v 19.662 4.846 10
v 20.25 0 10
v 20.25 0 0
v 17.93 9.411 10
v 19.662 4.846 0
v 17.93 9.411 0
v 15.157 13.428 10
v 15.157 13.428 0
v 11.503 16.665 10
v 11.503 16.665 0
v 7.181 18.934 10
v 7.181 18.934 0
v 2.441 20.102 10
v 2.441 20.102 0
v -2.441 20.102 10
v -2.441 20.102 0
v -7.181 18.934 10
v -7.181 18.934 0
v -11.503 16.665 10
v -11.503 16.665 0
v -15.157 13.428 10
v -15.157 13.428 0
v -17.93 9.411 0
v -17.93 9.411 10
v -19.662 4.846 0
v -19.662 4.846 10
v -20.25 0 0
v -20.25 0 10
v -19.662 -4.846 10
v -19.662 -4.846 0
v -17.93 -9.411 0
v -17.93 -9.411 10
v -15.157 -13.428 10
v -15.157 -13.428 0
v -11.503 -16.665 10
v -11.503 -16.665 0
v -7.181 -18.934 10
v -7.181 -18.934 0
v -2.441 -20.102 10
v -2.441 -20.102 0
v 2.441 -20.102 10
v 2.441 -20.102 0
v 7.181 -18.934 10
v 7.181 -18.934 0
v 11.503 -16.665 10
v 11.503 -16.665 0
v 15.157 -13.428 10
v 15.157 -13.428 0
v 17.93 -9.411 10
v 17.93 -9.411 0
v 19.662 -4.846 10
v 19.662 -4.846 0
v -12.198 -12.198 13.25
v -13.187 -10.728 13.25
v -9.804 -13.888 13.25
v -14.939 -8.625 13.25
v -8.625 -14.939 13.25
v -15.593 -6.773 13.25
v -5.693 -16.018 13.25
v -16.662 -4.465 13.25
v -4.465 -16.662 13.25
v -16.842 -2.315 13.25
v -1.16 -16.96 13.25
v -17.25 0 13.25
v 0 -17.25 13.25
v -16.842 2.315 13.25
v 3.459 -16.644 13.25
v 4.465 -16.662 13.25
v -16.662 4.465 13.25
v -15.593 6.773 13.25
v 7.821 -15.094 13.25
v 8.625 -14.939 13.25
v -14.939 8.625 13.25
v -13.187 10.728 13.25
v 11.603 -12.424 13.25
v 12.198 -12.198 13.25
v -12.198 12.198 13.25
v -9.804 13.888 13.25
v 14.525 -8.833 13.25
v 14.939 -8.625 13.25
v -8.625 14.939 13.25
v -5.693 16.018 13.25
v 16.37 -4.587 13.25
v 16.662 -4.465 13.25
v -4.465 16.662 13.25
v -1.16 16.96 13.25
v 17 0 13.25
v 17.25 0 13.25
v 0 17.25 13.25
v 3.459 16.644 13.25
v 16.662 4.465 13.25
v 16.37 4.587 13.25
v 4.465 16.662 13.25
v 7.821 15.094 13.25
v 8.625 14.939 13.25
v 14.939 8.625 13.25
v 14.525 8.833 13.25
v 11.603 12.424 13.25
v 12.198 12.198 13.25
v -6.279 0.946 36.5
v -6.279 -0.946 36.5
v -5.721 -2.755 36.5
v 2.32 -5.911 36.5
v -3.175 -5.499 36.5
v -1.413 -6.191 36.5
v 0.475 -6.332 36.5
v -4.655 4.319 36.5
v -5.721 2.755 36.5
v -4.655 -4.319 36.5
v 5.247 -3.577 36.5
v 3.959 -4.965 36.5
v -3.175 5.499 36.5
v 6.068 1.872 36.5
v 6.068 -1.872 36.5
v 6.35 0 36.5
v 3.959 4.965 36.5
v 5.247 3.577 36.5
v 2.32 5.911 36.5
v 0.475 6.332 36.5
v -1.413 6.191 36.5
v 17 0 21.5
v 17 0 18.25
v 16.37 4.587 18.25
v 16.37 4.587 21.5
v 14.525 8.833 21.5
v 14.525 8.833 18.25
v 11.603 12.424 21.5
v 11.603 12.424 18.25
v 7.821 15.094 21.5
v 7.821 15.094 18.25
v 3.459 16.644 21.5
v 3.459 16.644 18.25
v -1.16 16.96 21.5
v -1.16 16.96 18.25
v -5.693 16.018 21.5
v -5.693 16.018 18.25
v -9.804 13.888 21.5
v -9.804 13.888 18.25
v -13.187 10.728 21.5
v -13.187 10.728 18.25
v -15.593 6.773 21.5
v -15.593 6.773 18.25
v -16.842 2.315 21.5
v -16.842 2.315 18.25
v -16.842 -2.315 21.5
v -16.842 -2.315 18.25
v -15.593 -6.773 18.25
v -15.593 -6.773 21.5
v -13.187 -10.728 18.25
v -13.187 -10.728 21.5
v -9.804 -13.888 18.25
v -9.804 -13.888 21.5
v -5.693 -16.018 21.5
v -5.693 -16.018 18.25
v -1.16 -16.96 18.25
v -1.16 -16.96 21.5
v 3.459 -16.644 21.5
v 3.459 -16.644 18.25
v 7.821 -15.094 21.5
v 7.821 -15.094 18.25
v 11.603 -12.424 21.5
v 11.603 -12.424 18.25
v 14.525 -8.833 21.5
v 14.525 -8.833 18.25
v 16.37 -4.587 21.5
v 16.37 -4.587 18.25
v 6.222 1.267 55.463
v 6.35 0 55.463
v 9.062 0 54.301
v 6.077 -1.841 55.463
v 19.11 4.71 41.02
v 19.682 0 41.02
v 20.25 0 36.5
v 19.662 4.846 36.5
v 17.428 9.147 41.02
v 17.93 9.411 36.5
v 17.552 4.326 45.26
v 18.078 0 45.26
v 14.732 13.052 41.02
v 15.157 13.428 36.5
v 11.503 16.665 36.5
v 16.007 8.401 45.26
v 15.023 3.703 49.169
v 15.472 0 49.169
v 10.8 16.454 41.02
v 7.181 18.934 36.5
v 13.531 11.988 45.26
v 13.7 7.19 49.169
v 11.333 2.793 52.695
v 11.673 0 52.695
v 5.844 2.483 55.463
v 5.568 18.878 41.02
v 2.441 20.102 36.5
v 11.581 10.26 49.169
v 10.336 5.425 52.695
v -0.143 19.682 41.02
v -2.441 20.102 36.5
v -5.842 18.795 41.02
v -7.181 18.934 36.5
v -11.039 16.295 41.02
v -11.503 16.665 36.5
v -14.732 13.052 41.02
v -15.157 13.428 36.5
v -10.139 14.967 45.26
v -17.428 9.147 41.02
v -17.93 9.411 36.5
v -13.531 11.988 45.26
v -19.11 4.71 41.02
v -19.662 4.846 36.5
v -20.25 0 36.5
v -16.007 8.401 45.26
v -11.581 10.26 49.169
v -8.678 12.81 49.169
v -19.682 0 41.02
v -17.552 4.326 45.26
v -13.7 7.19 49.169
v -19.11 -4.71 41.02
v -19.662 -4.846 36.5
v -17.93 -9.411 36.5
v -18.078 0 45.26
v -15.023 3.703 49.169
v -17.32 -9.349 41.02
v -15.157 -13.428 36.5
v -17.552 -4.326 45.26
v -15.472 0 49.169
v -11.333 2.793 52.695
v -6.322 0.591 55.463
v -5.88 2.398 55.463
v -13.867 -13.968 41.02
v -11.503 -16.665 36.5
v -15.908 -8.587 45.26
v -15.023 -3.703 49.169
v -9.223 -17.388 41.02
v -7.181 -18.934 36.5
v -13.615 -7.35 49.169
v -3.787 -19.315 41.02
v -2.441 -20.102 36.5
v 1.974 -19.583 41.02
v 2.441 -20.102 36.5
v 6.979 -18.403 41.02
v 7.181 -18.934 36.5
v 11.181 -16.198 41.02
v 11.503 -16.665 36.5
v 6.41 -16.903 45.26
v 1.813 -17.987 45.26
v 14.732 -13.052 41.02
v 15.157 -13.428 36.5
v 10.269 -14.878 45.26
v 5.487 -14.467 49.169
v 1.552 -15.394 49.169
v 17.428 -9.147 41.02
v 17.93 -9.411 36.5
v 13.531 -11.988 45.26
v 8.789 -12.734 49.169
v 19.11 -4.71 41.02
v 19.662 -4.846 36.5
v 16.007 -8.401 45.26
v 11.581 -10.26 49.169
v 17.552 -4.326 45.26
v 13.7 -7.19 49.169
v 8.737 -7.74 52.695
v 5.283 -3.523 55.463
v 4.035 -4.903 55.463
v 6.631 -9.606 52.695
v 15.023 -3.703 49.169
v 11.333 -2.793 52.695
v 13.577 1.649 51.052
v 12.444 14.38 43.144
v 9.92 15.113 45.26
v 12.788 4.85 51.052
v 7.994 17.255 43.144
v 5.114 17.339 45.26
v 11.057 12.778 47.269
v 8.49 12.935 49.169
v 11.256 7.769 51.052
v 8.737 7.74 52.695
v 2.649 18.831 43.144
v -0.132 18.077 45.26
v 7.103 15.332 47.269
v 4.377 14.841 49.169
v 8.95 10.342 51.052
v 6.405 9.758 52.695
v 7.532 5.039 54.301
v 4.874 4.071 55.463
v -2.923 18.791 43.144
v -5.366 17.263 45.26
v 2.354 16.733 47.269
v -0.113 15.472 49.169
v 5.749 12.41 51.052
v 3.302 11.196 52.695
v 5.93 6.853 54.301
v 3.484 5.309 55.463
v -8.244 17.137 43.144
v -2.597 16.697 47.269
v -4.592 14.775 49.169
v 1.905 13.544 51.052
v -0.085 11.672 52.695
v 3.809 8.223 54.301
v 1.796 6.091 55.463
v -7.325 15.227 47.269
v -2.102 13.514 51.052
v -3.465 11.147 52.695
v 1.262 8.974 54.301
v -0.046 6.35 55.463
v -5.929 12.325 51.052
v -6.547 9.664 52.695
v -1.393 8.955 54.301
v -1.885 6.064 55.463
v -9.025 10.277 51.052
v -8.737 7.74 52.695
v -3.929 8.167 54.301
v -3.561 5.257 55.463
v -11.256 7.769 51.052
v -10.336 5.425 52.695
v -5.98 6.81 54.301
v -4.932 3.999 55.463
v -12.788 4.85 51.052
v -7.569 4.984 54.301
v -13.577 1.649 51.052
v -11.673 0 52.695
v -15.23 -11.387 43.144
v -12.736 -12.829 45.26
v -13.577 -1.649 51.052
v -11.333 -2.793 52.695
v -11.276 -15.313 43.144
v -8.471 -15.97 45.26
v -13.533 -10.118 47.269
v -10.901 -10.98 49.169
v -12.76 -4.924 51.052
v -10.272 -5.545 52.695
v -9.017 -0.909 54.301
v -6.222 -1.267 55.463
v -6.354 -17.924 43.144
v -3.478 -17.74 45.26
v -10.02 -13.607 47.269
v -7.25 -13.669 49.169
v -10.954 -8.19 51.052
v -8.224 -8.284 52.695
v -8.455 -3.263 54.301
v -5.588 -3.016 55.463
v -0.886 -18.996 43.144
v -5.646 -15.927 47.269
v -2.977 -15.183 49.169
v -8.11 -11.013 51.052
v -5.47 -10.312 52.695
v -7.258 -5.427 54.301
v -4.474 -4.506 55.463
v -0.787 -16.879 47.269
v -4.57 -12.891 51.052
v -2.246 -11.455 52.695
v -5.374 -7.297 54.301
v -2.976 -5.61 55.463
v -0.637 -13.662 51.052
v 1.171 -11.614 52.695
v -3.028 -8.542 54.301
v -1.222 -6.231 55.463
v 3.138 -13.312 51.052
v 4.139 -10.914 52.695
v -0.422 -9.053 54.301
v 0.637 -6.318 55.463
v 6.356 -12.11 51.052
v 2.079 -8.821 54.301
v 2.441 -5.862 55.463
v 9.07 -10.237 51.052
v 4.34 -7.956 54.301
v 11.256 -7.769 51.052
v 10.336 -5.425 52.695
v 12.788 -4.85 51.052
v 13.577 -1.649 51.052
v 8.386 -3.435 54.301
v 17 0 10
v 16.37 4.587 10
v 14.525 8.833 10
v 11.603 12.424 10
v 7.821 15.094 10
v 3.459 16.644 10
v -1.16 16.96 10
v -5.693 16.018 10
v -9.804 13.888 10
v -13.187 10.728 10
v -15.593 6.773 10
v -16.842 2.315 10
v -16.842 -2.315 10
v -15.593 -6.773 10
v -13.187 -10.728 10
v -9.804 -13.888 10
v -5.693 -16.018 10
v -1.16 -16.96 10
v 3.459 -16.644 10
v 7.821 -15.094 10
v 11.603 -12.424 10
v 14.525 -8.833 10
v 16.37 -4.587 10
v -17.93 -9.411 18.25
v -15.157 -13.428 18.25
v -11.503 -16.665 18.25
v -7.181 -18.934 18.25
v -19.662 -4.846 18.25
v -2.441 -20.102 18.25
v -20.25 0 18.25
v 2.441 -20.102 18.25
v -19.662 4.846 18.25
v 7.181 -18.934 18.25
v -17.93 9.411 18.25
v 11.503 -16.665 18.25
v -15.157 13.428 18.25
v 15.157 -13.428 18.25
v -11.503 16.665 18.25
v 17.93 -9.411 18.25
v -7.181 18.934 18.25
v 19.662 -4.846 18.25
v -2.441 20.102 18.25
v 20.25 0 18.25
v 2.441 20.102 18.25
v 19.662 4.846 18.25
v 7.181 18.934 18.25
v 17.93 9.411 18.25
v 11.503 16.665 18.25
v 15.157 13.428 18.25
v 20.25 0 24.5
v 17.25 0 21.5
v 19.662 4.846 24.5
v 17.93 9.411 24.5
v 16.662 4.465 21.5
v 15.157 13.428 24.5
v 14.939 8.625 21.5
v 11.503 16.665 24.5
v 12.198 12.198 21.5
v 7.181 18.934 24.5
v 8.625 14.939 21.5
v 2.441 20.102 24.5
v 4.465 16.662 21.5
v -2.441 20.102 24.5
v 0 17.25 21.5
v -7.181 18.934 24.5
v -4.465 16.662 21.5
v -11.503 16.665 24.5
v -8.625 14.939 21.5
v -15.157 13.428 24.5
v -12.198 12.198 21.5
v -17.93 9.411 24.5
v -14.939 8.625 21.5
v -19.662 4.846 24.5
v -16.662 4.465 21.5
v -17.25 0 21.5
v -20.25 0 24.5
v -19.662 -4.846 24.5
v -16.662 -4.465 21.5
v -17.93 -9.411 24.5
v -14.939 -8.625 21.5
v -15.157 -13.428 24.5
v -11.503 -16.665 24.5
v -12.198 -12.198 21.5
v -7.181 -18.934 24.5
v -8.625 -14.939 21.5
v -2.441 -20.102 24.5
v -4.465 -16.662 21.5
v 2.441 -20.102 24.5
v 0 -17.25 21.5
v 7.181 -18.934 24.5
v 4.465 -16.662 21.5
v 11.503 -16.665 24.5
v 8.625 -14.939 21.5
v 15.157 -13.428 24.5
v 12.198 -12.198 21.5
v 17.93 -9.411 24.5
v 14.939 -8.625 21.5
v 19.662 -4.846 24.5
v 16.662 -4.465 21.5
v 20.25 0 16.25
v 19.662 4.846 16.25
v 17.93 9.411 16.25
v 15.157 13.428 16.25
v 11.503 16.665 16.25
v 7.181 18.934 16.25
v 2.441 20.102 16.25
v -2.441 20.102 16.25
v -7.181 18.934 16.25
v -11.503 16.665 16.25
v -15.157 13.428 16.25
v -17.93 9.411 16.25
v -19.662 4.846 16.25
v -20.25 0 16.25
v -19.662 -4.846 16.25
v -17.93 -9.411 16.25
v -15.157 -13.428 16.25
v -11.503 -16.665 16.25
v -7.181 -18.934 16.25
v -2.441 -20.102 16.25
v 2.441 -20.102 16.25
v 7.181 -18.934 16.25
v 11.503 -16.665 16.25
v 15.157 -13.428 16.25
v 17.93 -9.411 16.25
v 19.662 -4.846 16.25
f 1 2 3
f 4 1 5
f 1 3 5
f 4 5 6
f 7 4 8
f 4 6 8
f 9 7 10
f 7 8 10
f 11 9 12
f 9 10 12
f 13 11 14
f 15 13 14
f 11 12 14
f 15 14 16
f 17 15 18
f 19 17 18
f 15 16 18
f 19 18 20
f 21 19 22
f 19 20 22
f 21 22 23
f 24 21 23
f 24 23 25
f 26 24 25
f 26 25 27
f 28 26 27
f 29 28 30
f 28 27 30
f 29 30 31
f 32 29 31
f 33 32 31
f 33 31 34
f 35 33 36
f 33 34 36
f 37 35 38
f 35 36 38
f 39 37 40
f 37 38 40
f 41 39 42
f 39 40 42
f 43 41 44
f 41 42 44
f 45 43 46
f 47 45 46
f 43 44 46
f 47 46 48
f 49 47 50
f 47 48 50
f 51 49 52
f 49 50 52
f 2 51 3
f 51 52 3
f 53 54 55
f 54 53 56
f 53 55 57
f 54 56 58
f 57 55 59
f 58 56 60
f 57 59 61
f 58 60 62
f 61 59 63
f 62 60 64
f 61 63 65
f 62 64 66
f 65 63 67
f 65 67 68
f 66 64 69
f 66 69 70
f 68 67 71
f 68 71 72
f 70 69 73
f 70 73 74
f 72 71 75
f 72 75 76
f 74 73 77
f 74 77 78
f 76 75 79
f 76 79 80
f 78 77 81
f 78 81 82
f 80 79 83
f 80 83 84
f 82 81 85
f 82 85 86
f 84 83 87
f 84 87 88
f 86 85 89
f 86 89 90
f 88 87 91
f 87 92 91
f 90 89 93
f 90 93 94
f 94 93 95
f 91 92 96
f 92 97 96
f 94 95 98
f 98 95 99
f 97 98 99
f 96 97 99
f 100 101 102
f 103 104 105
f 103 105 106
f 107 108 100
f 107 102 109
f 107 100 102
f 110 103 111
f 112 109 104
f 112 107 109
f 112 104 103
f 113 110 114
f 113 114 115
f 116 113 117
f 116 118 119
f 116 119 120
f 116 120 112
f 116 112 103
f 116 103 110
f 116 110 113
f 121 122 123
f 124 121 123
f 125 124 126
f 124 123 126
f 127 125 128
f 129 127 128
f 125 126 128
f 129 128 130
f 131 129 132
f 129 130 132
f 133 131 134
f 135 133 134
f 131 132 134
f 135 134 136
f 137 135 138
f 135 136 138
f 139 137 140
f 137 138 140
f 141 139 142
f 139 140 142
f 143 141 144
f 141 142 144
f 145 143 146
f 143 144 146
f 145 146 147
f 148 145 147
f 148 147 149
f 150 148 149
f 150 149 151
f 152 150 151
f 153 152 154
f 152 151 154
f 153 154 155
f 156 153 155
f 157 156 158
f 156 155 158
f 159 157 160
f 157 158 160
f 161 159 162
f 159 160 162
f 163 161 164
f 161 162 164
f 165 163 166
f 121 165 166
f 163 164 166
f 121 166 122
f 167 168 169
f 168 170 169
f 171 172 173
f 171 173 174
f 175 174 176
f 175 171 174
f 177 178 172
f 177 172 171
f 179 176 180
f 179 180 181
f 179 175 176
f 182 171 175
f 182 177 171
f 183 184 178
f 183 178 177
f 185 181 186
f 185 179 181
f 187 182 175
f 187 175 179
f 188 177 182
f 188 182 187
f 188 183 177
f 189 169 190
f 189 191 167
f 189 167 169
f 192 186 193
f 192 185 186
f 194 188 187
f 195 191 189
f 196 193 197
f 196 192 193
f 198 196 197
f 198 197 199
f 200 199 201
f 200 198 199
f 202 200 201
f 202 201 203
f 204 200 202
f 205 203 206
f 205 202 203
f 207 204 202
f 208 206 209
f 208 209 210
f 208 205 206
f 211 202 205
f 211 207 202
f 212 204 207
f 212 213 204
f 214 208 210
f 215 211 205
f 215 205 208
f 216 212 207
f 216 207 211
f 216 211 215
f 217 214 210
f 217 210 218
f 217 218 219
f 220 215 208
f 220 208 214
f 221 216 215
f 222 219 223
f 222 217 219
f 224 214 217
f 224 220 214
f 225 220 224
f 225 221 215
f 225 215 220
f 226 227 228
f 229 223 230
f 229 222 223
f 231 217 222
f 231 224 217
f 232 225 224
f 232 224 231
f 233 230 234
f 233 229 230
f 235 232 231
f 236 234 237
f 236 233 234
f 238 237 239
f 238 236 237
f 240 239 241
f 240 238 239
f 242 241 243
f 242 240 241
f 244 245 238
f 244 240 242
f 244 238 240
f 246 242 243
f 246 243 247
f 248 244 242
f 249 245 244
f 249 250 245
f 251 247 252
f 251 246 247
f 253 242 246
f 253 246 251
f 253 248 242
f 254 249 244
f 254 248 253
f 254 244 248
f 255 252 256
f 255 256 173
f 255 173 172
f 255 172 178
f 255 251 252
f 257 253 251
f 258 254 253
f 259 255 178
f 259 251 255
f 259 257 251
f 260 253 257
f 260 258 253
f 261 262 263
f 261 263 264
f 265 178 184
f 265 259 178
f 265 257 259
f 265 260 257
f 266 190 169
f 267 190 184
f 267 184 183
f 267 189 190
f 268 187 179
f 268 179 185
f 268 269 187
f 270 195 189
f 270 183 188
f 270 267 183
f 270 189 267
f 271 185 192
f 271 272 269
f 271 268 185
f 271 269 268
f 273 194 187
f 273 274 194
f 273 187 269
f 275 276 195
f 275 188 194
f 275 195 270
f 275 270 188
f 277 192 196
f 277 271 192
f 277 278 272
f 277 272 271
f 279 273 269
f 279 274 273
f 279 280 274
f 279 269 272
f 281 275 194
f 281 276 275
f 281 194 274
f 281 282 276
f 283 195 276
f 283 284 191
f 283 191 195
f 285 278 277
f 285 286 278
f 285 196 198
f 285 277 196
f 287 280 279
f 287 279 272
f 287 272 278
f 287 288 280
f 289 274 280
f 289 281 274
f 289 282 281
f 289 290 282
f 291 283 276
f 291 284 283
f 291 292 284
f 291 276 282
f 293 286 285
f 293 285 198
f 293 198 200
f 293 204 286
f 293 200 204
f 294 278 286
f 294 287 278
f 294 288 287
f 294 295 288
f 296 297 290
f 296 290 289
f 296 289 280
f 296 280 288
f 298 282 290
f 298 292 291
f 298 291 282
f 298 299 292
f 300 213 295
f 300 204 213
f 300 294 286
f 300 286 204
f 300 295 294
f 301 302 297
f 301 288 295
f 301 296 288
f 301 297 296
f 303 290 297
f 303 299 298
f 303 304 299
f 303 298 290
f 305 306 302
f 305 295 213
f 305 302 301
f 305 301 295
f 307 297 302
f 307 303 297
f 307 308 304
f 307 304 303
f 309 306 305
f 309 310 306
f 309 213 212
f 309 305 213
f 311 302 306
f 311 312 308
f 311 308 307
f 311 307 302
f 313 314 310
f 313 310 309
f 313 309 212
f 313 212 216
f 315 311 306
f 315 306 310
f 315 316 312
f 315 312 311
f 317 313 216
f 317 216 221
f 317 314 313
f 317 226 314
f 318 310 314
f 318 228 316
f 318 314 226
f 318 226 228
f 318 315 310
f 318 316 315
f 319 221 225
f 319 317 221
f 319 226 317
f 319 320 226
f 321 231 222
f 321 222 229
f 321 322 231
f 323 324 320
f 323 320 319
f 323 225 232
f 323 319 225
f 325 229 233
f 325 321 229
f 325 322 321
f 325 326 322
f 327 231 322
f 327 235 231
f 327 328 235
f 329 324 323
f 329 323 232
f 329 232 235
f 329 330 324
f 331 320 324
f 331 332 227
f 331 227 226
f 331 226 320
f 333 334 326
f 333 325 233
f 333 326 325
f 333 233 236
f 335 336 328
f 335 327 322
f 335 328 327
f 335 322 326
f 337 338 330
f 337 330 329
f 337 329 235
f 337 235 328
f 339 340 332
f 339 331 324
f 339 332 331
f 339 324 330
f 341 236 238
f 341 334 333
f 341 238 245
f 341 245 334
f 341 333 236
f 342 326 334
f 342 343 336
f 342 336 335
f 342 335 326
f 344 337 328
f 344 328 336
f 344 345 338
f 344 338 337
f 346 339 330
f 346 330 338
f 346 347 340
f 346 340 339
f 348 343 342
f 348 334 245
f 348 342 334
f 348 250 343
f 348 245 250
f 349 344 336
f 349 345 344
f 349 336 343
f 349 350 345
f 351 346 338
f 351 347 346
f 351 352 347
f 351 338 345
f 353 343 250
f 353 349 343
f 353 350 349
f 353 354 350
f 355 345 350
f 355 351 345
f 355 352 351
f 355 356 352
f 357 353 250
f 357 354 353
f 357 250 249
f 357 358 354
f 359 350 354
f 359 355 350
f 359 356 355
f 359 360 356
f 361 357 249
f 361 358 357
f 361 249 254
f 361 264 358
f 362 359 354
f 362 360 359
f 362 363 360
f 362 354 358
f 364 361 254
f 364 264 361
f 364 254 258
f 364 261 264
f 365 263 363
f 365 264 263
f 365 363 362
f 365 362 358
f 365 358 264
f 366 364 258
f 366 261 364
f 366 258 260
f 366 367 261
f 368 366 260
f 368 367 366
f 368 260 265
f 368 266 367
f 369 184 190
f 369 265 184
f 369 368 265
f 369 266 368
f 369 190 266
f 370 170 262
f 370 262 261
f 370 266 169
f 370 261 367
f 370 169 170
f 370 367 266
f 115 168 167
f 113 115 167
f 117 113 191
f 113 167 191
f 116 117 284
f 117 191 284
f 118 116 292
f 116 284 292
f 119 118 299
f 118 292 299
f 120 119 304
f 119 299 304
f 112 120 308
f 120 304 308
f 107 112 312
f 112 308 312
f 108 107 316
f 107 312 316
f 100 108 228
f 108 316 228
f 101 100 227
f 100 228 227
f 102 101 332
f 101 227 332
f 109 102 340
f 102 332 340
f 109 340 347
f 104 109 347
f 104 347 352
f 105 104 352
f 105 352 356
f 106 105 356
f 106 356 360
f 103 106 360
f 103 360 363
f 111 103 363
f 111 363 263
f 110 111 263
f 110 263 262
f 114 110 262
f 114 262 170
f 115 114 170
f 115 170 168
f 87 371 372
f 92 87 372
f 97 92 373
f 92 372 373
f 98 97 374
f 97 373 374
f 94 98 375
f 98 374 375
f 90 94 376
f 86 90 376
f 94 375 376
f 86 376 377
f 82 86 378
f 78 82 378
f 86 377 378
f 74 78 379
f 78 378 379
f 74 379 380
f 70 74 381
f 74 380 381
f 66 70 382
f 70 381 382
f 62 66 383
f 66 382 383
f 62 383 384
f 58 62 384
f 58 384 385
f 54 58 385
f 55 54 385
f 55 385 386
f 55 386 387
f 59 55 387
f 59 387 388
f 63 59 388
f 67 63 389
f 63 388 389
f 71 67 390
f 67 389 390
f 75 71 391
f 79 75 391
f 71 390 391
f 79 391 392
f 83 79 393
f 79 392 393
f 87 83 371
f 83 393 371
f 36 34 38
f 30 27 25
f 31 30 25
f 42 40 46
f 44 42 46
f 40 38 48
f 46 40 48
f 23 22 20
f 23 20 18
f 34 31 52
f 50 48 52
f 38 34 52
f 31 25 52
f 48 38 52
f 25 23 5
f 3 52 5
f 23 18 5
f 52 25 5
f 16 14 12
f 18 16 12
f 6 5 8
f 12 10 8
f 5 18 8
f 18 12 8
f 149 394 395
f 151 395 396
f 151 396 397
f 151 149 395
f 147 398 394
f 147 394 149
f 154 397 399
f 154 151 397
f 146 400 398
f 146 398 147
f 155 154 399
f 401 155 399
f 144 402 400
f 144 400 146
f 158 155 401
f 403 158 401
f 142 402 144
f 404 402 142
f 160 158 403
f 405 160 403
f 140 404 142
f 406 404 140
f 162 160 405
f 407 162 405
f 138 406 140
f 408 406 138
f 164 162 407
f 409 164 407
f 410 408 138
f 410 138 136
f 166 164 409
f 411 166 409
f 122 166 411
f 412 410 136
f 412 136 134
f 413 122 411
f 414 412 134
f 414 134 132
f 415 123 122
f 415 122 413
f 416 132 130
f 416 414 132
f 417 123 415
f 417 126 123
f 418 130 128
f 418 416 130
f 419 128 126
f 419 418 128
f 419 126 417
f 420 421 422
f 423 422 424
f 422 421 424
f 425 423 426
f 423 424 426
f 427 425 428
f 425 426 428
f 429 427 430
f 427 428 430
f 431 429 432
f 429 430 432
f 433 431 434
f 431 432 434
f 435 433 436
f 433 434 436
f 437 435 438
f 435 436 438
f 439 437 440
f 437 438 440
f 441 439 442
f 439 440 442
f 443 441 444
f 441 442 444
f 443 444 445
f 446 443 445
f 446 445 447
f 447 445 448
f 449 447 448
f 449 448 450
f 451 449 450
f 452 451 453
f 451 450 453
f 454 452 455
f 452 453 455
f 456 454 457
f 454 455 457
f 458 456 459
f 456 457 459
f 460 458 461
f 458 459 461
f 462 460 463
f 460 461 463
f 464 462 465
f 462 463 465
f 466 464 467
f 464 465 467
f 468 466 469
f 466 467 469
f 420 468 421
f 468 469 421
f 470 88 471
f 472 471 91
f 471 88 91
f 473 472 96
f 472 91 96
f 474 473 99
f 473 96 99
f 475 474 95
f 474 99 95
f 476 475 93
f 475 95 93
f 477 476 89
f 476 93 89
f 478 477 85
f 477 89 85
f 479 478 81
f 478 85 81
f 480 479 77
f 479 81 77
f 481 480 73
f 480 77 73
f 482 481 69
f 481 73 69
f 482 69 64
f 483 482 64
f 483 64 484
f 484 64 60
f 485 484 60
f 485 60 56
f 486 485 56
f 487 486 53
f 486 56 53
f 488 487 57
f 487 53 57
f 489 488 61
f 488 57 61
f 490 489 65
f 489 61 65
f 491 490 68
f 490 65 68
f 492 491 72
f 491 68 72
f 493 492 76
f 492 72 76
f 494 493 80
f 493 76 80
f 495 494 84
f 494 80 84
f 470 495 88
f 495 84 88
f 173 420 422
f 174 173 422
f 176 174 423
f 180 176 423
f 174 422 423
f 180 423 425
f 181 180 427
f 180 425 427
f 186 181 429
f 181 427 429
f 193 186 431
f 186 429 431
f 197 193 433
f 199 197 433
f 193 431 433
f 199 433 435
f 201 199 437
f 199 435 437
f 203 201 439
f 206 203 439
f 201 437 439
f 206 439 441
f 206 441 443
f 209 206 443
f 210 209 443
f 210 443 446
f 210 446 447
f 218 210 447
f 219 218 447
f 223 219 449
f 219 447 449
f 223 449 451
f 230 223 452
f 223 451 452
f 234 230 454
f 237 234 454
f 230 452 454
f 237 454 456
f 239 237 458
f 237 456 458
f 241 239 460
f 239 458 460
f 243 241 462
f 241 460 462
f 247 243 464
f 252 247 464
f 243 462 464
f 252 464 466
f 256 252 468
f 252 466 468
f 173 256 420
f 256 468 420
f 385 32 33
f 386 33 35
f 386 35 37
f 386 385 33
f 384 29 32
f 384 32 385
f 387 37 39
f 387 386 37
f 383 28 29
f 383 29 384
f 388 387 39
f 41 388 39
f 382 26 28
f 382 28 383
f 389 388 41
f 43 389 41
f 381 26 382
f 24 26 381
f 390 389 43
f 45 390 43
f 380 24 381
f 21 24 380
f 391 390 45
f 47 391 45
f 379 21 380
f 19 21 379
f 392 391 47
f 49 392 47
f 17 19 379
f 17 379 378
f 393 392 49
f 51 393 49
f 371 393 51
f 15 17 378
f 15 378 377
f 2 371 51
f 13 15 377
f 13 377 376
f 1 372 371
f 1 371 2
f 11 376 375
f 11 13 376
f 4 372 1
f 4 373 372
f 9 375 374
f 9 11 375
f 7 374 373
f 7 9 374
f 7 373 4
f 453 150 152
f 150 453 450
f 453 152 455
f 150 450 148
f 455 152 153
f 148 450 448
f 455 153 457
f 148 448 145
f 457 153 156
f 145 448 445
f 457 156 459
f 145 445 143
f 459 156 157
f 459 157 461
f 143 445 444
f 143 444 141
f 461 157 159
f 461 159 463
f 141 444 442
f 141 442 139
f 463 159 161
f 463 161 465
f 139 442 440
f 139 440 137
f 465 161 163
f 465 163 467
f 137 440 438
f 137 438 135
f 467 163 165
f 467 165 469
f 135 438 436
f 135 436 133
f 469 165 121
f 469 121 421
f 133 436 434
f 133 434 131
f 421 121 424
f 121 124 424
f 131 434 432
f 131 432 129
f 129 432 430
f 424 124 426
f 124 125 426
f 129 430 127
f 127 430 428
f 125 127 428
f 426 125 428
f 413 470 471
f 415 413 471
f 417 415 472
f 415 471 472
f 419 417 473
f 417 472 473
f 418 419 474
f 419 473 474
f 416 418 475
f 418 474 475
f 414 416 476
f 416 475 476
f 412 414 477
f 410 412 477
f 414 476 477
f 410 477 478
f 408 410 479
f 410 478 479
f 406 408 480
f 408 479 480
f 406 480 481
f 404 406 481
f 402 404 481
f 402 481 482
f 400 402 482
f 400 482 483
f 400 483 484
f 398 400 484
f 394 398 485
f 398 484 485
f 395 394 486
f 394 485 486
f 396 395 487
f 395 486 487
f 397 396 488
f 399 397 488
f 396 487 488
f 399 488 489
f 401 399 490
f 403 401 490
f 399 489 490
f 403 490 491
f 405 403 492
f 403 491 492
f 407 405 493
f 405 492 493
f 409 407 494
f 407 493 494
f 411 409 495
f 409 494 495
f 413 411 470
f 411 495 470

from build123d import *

# Parameters (mm, degrees)
F0_R      = 20.25
F1_DEPTH  = 10
F2_R      = 17
F3_DEPTH  = 3.25
F4_R      = 20.25
F4_R_2    = 17
F5_DEPTH  = 5
F6_R      = 17
F7_DEPTH  = 3.25
F8_R      = 20.25
F8_R_2    = 17
F9_DEPTH  = 25
F10_DEPTH = 5
F11_DEPTH = 5
F13_R     = 6.35
F13_R_2   = 0.25
F14_DEPTH = 20
F15_SIZE  = 3


# Not quite as in the source:
# - a fillet or chamfer that OpenCascade refuses, or shapes differently, is made with other operations: its cross-section is extruded or revolved along the edge and cut away or added


with BuildPart() as f1:
    # F0 (on Top) → F1 (new body)
    with BuildSketch(Plane.XY):
        Circle(F0_R)
    extrude(amount=F1_DEPTH)

    # F2 (on face) → F3 (join)
    with BuildSketch(Plane.XY.offset(10)):
        Circle(F2_R)
    extrude(amount=F3_DEPTH)

    # F4 (on face) → F5 (join)
    with BuildSketch(Plane.XY.offset(13.25)):
        Circle(F4_R)
        Circle(F4_R_2, mode=Mode.SUBTRACT)
        Circle(F4_R_2)
    extrude(amount=F5_DEPTH)

    # F6 (on face) → F7 (join)
    with BuildSketch(Plane.XY.offset(18.25)):
        Circle(F6_R)
    extrude(amount=F7_DEPTH)

    # F8 (on face) → F9 (join)
    with BuildSketch(Plane.XY.offset(21.5)):
        Circle(F8_R)
        Circle(F8_R_2, mode=Mode.SUBTRACT)
        Circle(F8_R_2)
    extrude(amount=F9_DEPTH)

    # F10 (add): a face of the model
    f10_faces = [f1.faces().sort_by_distance(p)[0] for p in [
        (0, 0, 46.5),
    ]]
    extrude(f10_faces, amount=F10_DEPTH)

    # F11 (add): a face of the model
    f11_faces = [f1.faces().sort_by_distance(p)[0] for p in [
        (0, 0, 51.5),
    ]]
    extrude(f11_faces, amount=F11_DEPTH)

    # F12: fillet of radius 20 on 1 edges, made by hand

    # F12_s1 → F12_t2 (revolve, cut)
    with BuildSketch(Plane.XZ):
        with BuildLine():
            add(Edge.make_bspline(
                [(20.25, 36.5), (20.25, 56.5), (0.25, 56.5)],
                knots=[0, 0, 0, 1, 1, 1], degree=2, weights=[1, 0.6666666667, 1]))
            Line((0.25, 56.5), (20.25, 56.5))
            Line((20.25, 56.5), (20.25, 36.5))
        make_face()
    revolve(axis=Axis((0, 0, 56.5), (0, 0, 1)), mode=Mode.SUBTRACT)

    # F13 (on face) → F14 (cut)
    with BuildSketch(Plane.XY.offset(56.5)):
        Circle(F13_R)
        Circle(F13_R_2, mode=Mode.SUBTRACT)
        Circle(F13_R_2)
    extrude(amount=-F14_DEPTH, mode=Mode.SUBTRACT)

    # F15
    f15_edges = [f1.edges().sort_by_distance(p)[0] for p in [
        (-20.25, 0, 13.25),
        (-20.25, 0, 21.5),
    ]]
    chamfer(f15_edges, length=F15_SIZE)


solid = f1.part
